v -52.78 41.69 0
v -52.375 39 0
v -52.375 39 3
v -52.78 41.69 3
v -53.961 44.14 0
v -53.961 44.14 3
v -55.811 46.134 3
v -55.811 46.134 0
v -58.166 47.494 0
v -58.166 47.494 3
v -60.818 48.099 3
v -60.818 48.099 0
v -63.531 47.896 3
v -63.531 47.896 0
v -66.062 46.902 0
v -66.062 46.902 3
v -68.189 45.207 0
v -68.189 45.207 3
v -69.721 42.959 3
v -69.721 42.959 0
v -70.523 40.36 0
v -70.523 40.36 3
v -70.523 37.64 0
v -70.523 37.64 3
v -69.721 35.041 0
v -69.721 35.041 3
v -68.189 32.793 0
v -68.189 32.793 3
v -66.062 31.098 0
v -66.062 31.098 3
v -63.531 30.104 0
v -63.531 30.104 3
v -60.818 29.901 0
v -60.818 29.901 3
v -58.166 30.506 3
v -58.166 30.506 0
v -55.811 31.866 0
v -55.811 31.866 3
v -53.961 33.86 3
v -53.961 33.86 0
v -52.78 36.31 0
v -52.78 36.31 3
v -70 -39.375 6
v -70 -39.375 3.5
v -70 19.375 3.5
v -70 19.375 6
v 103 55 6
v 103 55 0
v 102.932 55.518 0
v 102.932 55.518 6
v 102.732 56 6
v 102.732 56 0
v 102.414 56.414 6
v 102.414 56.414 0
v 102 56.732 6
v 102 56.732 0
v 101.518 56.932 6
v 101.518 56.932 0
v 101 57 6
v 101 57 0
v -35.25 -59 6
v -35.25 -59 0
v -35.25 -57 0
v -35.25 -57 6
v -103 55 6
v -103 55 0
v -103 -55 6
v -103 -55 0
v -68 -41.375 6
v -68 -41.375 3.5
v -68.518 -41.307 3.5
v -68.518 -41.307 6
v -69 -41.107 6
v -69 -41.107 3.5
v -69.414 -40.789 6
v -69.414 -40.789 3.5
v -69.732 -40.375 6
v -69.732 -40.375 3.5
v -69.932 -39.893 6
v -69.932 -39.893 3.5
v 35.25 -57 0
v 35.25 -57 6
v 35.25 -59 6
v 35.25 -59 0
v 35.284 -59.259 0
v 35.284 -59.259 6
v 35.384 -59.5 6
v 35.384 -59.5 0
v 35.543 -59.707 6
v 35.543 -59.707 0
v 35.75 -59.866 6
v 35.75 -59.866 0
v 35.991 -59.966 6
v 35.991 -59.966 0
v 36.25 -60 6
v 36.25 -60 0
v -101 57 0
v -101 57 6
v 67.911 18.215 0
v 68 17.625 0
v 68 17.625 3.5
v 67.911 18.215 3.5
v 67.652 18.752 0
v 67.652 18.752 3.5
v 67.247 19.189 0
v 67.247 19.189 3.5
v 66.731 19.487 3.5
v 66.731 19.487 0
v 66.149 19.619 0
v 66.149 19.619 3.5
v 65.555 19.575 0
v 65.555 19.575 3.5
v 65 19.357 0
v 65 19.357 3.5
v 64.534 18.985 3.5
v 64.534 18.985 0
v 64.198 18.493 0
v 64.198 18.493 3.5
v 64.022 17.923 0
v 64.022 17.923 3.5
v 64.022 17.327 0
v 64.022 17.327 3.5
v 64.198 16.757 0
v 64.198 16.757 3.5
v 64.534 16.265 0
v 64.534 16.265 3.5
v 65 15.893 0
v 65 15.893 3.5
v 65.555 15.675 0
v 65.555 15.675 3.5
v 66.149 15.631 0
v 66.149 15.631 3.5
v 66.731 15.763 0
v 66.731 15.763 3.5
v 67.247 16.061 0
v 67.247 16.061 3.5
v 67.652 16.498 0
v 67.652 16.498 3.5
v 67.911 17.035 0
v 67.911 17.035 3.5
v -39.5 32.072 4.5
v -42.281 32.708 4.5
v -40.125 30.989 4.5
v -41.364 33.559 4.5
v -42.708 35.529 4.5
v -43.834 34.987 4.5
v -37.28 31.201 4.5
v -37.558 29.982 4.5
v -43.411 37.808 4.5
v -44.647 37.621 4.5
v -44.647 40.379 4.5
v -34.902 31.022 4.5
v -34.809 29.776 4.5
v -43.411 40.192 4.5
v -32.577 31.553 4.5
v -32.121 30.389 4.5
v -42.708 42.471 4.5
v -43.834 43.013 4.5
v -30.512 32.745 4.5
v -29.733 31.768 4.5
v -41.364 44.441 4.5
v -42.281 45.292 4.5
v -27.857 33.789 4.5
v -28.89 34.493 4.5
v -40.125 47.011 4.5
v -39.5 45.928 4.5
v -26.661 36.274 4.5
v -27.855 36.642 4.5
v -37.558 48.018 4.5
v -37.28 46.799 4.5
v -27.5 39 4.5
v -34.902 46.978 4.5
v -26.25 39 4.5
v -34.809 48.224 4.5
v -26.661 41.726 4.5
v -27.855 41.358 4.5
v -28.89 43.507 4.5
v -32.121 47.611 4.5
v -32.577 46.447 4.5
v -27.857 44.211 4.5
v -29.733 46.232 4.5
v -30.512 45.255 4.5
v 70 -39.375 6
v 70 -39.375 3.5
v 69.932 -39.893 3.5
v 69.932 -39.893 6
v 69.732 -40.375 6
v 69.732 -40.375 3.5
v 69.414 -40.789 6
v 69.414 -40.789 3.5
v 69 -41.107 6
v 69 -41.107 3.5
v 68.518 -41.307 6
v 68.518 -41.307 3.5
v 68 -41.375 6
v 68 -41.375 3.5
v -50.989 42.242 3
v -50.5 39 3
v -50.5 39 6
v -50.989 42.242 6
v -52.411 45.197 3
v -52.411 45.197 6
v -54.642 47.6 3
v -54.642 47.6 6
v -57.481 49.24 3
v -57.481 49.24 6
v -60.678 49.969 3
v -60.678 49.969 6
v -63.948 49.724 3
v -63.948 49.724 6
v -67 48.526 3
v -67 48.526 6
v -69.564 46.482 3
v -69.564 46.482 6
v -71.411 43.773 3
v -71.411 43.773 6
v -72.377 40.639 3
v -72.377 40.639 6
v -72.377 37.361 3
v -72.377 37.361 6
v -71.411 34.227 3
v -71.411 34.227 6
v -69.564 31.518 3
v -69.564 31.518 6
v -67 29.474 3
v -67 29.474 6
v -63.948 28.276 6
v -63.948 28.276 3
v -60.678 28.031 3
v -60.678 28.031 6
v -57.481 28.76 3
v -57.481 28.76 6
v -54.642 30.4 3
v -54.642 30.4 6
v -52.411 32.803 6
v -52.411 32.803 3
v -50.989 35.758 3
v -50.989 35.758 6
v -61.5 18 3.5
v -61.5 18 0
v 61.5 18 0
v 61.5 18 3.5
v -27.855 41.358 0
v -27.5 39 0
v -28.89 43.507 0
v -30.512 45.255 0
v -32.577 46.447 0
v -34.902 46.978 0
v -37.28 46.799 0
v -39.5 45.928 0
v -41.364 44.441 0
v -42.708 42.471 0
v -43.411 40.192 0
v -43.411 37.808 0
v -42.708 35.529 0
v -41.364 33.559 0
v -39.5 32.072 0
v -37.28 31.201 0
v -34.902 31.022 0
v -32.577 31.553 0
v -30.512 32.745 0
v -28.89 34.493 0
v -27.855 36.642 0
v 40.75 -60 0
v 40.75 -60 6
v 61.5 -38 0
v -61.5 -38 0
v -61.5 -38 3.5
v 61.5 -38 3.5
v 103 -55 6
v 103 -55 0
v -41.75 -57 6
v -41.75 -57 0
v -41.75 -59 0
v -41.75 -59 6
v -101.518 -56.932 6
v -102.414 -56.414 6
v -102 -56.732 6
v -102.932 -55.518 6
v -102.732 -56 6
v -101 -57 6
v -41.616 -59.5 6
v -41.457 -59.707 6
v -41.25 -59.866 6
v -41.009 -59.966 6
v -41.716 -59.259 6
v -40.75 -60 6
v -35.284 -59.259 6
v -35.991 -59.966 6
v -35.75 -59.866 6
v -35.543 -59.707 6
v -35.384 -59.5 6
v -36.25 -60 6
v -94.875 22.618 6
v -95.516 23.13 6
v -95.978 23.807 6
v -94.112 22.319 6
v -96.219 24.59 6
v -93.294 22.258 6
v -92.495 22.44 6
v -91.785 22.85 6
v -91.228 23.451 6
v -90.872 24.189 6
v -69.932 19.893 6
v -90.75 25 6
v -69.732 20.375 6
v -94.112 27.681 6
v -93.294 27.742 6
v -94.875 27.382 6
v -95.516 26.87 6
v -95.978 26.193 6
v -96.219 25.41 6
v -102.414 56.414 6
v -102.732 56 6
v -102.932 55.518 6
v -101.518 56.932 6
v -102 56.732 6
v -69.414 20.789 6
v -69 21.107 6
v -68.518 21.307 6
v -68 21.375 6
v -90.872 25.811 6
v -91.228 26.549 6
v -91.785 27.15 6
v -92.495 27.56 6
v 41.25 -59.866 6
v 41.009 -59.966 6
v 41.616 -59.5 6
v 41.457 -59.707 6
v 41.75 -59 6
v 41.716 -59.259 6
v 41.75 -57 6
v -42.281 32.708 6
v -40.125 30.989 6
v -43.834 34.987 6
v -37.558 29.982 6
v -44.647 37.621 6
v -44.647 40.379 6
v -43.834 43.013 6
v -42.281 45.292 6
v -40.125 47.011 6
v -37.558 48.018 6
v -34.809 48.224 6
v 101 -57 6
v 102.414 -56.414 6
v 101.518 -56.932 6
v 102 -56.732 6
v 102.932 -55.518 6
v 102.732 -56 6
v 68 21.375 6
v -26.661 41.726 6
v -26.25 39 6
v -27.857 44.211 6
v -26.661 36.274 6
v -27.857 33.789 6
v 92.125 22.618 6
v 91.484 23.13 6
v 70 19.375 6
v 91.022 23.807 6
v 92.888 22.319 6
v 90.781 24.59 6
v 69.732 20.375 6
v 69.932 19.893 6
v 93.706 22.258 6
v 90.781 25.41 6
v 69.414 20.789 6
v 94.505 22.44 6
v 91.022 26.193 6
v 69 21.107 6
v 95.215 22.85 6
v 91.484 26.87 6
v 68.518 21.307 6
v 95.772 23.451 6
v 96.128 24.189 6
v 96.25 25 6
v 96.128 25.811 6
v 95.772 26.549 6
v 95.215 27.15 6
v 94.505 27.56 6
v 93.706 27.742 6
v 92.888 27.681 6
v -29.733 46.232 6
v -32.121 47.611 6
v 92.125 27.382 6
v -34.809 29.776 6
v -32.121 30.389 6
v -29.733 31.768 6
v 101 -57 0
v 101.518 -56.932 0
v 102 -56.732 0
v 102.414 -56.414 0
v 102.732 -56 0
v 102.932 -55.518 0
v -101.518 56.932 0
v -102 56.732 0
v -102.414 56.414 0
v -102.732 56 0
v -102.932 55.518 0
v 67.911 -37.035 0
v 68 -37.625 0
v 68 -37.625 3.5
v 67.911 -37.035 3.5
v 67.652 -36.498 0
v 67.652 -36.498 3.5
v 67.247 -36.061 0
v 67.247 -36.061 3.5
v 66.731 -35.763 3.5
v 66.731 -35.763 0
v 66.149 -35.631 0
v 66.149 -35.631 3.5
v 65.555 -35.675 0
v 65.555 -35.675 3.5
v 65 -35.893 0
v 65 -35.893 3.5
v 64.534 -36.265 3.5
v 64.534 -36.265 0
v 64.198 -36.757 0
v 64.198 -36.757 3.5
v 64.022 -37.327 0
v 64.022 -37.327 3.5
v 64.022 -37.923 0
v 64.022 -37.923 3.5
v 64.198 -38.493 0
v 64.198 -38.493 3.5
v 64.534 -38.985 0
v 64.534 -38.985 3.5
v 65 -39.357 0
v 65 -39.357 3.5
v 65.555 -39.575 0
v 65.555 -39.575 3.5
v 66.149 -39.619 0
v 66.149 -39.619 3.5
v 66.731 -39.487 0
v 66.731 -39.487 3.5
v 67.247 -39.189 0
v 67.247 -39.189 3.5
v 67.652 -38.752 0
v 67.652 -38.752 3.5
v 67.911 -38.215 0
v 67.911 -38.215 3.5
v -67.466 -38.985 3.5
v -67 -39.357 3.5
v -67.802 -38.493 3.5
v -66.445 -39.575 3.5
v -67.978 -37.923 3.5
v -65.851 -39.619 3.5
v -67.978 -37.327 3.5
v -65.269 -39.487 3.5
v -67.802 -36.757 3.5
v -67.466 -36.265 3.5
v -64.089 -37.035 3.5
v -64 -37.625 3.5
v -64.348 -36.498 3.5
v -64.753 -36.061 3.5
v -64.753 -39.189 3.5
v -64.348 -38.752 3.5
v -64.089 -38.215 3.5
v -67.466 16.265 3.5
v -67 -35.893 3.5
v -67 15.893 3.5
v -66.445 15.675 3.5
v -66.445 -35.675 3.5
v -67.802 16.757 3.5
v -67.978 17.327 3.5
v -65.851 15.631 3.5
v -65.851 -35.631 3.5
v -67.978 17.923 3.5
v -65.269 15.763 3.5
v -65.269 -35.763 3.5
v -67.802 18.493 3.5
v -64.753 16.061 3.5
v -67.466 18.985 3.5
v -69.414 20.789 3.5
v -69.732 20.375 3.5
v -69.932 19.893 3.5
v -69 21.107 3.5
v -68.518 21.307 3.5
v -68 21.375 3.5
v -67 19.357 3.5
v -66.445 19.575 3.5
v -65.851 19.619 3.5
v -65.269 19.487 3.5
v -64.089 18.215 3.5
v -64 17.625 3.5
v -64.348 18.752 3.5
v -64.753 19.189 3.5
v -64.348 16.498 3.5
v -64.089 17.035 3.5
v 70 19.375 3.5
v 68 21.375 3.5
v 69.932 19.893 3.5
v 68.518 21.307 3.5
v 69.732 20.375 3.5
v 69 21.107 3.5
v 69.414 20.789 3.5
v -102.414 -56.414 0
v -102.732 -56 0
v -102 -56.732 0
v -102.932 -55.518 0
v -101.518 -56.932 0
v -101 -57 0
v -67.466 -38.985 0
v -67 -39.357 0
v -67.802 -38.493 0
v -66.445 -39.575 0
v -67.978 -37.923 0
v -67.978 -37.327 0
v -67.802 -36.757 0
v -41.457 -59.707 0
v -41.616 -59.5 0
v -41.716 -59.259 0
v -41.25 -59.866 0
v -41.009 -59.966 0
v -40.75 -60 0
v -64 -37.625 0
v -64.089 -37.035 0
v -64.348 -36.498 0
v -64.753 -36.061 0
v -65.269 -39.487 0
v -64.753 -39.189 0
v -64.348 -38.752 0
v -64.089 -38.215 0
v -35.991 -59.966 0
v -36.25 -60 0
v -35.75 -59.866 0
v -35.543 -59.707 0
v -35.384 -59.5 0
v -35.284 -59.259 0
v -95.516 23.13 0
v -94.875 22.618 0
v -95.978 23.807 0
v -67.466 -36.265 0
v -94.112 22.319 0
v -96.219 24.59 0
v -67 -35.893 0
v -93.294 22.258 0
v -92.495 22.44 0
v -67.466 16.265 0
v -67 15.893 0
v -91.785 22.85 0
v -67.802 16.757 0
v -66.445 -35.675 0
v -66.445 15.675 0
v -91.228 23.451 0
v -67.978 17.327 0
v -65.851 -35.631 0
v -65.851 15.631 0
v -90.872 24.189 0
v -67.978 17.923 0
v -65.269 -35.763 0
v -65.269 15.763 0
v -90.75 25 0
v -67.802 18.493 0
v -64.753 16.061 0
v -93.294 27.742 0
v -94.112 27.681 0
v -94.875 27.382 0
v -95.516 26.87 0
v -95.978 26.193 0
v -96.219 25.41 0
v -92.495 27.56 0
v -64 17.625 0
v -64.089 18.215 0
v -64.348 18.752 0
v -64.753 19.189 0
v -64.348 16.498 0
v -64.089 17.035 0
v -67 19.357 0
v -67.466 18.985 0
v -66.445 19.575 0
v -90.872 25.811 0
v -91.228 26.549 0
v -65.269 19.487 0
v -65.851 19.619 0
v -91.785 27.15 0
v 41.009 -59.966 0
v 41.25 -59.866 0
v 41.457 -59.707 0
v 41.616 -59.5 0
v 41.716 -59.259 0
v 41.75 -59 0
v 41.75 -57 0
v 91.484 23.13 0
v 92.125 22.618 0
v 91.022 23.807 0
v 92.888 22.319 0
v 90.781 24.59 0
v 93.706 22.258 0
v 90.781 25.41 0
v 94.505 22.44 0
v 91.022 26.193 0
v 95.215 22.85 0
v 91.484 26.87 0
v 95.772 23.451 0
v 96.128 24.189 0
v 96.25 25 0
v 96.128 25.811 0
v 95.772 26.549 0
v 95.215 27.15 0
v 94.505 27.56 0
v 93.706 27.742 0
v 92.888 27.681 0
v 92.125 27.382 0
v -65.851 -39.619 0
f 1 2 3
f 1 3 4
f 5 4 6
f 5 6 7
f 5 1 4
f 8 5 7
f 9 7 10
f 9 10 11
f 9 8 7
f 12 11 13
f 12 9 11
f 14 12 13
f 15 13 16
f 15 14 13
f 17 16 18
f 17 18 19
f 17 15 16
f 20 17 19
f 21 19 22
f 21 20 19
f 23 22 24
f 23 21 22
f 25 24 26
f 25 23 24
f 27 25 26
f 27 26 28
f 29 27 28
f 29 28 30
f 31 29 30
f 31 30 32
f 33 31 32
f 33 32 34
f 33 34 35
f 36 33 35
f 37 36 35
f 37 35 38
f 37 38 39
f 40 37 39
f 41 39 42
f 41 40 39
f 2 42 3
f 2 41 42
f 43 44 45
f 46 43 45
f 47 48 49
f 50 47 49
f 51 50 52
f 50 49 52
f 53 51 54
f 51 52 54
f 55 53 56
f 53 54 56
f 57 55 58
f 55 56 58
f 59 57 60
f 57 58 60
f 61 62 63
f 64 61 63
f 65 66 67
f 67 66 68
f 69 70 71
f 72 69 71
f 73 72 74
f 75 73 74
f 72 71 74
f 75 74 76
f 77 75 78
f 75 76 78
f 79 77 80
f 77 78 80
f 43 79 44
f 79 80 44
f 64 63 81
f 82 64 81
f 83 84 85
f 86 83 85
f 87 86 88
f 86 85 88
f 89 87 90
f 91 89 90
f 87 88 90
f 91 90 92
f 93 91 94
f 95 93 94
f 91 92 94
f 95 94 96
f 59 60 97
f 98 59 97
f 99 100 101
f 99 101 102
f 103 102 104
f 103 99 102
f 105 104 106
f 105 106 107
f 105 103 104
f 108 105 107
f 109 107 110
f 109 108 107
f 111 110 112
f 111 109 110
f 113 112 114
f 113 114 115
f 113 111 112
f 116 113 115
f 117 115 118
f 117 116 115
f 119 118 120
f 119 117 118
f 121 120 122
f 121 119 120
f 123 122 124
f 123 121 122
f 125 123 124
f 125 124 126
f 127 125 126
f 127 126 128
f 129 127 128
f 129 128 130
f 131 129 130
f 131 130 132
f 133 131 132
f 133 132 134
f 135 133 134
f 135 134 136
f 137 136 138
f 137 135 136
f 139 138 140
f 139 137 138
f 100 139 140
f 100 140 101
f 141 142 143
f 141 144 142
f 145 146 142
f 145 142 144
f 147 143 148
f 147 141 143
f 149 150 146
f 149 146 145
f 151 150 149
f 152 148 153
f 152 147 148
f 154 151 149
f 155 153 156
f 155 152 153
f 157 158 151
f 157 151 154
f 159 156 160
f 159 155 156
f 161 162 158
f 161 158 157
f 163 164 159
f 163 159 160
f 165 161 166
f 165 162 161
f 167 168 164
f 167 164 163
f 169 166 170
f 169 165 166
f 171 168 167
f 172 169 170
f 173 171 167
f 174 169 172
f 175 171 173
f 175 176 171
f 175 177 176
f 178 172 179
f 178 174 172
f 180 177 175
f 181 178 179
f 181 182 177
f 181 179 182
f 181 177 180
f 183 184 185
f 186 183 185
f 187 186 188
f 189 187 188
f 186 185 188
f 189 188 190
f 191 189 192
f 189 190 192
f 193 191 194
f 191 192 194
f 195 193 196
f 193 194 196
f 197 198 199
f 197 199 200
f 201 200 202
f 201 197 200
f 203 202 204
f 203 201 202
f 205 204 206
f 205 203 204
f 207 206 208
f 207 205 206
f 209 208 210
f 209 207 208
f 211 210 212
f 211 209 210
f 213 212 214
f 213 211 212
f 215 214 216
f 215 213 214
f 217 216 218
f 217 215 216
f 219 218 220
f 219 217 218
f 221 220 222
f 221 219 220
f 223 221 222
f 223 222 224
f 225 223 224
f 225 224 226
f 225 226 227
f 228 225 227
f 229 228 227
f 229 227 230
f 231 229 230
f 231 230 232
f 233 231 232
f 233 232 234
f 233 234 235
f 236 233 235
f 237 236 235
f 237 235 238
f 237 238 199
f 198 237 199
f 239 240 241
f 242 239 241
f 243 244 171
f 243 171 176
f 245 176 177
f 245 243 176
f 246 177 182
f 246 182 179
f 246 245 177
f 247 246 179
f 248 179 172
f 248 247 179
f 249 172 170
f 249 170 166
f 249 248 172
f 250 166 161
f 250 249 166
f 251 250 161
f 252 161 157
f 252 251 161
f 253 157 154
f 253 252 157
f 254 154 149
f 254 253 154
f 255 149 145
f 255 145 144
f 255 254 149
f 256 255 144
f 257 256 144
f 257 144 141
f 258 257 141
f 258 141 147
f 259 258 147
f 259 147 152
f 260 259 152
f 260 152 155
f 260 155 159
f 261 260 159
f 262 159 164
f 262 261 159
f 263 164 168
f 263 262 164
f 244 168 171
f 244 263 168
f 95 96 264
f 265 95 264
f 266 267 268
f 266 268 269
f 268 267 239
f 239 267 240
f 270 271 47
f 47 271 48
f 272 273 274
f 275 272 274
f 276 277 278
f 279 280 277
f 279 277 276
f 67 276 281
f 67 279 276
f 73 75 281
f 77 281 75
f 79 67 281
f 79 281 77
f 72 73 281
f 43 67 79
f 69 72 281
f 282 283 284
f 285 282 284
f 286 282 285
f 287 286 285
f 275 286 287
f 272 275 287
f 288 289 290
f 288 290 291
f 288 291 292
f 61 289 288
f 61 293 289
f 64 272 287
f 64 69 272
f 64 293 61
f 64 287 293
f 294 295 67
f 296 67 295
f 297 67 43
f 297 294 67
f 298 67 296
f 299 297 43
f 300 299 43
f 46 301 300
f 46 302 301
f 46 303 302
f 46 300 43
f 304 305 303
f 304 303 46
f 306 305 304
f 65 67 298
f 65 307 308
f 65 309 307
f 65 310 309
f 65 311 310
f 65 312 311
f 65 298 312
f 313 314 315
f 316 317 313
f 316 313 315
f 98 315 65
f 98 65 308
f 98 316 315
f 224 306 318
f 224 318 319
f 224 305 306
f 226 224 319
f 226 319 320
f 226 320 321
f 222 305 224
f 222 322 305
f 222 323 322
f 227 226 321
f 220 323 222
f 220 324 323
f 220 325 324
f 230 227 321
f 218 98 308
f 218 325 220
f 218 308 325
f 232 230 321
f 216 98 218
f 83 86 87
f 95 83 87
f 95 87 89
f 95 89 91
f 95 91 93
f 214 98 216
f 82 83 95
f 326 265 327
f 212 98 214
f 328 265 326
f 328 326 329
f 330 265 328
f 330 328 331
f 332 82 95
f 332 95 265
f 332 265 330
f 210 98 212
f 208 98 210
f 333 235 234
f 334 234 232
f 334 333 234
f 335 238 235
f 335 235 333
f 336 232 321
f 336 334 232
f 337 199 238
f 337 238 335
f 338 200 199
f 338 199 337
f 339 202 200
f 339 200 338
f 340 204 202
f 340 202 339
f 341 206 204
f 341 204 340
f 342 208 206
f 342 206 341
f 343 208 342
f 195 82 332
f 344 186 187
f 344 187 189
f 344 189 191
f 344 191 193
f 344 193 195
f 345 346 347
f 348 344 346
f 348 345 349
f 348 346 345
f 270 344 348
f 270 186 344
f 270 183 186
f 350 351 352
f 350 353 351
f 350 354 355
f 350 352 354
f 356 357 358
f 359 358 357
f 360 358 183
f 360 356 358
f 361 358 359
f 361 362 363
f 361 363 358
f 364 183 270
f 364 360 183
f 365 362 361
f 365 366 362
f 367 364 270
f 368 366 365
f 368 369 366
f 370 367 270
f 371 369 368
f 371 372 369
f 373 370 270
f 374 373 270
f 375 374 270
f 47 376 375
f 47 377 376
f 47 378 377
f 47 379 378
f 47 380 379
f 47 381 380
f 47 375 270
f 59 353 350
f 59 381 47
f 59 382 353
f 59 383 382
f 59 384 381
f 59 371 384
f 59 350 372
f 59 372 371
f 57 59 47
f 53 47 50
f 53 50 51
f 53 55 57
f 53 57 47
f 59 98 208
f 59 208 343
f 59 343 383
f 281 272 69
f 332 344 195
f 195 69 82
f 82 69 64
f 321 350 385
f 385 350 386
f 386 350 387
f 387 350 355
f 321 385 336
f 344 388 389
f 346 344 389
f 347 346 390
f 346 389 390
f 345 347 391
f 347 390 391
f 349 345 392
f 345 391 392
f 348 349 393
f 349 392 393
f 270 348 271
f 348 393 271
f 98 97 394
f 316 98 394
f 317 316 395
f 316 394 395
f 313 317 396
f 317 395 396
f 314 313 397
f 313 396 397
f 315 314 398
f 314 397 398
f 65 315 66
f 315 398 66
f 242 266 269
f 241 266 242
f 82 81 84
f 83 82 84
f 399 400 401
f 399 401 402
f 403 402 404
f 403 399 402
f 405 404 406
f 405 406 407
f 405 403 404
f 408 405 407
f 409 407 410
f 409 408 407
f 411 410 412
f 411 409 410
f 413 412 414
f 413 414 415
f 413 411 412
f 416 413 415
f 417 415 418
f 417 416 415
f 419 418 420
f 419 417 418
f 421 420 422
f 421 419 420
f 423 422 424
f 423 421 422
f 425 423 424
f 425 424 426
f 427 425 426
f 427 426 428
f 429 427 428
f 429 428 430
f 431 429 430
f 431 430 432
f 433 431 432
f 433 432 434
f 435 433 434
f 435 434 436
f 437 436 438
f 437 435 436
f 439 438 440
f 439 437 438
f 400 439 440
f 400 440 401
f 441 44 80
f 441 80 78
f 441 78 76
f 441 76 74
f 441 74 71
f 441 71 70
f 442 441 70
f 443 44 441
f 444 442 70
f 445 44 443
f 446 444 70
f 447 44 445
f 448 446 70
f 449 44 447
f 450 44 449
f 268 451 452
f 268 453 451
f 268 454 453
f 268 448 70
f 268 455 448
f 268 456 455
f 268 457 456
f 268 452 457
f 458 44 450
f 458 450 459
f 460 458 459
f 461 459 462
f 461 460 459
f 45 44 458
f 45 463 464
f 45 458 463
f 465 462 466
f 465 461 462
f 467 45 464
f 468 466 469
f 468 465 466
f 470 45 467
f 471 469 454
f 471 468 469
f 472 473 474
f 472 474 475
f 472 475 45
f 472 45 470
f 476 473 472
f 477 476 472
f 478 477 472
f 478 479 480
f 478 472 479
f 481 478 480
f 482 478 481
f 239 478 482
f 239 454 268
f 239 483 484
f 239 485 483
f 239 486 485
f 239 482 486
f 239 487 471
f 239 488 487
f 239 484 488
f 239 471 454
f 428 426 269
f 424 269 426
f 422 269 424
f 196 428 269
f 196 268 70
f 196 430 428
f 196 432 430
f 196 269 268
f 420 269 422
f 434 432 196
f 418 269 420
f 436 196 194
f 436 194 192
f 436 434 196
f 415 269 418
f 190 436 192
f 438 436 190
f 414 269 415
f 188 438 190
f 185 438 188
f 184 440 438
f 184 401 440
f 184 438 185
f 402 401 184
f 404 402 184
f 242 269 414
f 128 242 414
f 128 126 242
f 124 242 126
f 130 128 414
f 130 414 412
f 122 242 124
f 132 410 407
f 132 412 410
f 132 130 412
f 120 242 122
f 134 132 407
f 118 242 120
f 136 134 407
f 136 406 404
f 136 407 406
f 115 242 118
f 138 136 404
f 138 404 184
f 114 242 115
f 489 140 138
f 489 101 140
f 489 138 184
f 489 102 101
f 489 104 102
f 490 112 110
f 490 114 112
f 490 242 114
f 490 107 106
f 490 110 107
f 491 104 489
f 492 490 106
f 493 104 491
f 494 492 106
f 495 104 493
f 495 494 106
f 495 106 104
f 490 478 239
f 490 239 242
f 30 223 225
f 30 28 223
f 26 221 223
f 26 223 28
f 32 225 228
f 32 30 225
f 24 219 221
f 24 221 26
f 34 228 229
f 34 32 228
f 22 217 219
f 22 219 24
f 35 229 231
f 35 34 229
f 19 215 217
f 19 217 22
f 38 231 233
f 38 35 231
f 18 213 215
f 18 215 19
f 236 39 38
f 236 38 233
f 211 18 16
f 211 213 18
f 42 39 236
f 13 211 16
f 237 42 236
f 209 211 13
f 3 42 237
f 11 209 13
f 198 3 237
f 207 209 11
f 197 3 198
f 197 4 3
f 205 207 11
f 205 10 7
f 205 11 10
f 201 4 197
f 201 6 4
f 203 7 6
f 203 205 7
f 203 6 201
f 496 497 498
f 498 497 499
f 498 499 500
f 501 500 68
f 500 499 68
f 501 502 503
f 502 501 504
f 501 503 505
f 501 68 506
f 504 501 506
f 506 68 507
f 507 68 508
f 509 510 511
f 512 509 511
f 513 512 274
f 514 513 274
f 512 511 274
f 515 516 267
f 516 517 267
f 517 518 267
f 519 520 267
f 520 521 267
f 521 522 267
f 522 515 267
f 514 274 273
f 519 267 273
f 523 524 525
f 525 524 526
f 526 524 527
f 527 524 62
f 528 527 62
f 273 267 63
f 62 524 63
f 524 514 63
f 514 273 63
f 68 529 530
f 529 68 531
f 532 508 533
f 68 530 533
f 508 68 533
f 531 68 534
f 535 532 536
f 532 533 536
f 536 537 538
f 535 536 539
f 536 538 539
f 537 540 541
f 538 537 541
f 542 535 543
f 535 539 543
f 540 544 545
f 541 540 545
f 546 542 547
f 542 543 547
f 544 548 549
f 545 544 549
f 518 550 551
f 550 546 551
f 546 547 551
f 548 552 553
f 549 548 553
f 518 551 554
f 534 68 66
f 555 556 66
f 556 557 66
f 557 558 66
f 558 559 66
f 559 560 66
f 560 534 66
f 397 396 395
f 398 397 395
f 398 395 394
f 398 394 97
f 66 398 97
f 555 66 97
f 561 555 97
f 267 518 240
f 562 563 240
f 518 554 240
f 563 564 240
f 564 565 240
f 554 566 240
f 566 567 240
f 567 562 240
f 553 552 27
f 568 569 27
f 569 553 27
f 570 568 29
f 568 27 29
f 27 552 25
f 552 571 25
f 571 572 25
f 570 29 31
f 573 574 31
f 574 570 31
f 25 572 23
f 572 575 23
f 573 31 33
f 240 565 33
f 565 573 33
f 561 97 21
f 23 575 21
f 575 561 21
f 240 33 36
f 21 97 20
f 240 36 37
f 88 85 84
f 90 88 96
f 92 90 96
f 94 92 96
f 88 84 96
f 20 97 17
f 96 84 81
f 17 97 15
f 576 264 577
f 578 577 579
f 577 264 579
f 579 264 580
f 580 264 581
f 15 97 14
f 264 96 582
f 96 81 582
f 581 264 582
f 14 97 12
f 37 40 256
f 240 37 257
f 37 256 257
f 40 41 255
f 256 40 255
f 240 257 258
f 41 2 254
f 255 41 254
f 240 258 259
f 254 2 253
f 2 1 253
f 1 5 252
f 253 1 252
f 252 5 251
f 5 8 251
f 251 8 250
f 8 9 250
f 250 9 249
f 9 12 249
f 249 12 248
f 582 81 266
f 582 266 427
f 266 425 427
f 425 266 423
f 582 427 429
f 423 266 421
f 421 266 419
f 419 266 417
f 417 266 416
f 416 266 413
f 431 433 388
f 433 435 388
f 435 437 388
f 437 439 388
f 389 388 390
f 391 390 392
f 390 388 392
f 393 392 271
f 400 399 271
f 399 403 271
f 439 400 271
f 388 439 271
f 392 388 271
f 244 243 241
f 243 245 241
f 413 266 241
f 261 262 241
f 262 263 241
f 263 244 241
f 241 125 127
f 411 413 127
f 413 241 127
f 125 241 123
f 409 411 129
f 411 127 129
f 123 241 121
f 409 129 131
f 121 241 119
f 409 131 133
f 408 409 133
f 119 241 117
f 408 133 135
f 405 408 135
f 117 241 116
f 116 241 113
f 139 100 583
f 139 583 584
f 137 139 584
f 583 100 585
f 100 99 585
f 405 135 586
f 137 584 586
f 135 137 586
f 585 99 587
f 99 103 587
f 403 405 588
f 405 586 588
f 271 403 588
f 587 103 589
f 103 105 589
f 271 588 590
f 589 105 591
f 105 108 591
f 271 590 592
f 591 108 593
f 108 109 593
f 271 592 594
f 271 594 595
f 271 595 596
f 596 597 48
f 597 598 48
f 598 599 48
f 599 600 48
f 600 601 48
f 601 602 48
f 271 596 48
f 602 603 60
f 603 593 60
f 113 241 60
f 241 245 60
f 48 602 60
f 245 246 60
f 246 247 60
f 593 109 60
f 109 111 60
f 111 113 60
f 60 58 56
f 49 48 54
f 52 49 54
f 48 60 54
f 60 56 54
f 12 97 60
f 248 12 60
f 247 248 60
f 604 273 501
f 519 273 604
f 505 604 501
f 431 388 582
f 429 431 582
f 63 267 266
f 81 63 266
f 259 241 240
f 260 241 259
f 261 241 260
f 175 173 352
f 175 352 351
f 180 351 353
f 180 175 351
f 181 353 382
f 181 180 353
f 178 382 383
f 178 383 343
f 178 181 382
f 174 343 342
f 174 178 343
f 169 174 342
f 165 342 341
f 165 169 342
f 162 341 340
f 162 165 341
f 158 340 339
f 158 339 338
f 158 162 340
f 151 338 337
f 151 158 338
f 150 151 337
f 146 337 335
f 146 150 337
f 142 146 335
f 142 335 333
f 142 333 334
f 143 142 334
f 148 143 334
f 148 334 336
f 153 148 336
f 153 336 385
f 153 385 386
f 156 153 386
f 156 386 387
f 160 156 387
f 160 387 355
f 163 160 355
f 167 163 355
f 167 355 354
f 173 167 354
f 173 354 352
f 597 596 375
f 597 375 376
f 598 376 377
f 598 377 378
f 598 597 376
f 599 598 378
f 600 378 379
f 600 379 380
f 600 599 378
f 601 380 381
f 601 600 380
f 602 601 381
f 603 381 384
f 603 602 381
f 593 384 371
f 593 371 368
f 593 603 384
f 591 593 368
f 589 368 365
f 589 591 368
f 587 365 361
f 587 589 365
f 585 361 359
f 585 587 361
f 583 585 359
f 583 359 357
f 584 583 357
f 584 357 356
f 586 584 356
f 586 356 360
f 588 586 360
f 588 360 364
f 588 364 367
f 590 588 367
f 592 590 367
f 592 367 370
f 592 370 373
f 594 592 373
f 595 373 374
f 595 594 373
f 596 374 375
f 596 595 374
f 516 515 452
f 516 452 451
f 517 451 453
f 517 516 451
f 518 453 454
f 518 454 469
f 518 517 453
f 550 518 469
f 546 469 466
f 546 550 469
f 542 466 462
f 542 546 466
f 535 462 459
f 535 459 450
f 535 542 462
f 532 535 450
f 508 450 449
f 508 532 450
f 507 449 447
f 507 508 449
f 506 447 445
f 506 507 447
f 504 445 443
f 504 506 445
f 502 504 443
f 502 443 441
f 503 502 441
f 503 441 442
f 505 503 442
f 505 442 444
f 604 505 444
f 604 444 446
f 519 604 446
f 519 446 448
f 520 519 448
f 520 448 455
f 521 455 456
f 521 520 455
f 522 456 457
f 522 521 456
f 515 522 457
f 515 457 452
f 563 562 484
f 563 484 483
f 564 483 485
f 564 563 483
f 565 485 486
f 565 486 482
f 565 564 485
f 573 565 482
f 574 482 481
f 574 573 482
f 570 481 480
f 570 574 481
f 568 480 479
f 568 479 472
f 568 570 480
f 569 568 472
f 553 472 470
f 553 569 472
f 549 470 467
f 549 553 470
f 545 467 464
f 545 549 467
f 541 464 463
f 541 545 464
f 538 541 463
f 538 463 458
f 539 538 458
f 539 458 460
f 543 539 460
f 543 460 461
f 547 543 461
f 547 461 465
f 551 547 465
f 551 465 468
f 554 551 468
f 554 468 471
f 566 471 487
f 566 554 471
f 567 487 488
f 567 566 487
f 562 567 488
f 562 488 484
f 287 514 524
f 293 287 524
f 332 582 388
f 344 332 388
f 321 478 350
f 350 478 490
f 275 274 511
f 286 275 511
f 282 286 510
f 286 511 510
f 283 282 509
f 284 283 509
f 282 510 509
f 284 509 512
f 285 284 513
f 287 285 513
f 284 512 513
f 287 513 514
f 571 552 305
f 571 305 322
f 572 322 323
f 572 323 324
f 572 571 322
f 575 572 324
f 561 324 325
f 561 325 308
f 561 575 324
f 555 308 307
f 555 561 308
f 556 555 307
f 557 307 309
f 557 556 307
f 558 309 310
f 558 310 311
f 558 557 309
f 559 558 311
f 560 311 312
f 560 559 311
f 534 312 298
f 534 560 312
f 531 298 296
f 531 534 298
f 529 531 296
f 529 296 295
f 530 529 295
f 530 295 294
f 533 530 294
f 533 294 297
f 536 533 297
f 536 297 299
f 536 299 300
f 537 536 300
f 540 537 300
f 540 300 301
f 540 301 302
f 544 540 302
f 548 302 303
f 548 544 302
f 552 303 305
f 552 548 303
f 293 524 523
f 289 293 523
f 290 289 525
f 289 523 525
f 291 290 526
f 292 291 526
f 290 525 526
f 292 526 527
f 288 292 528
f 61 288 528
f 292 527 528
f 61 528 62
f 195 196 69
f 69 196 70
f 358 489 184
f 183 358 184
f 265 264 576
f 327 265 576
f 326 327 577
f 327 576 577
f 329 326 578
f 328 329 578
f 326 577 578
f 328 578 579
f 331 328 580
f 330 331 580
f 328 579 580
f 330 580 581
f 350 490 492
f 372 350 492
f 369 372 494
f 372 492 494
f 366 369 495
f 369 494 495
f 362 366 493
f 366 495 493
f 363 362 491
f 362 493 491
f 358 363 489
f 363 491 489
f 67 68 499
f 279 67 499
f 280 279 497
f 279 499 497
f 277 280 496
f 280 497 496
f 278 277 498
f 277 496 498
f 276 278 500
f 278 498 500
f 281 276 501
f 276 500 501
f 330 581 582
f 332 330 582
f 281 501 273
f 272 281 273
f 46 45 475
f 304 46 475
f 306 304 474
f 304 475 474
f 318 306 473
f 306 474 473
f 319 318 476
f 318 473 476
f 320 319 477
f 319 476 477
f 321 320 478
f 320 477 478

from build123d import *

# Parameters (mm, degrees)
F0_R     = 2.75
F0_R_2   = 11
F0_R_3   = 9.25
F1_DEPTH = 6
F0_R_4   = 2
F0_W     = 123
F0_H     = 56
F2_DEPTH = 3.5
F0_R_5   = 9.125
F3_DEPTH = 3
F0_R_6   = 8
F4_DEPTH = 4.5


with BuildPart() as f1:
    # F0 (on Top) → F1 (new body)
    with BuildSketch(Plane.XY):
        with BuildLine():
            Line((41.75, -57), (101, -57))
            ThreePointArc((101, -57), (102.414214, -56.414214), (103, -55))
            Line((103, -55), (103, 55))
            ThreePointArc((103, 55), (102.414214, 56.414214), (101, 57))
            Line((101, 57), (-101, 57))
            ThreePointArc((-101, 57), (-102.414214, 56.414214), (-103, 55))
            Line((-103, 55), (-103, -55))
            ThreePointArc((-103, -55), (-102.414214, -56.414214), (-101, -57))
            Line((-101, -57), (-41.75, -57))
            Line((-41.75, -57), (-35.25, -57))
            Line((-35.25, -57), (0, -57))
            Line((0, -57), (35.25, -57))
            Line((35.25, -57), (41.75, -57))
        make_face()
        with BuildLine():
            ThreePointArc((70, -39.375), (69.414214, -40.789214), (68, -41.375))
            Line((68, -41.375), (-68, -41.375))
            ThreePointArc((-68, -41.375), (-69.414214, -40.789214), (-70, -39.375))
            Line((-70, -39.375), (-70, 19.375))
            ThreePointArc((-70, 19.375), (-69.414214, 20.789214), (-68, 21.375))
            Line((-68, 21.375), (68, 21.375))
            ThreePointArc((68, 21.375), (69.414214, 20.789214), (70, 19.375))
            Line((70, 19.375), (70, -39.375))
        make_face(mode=Mode.SUBTRACT)
        with Locations((-93.5, 25)):
            Circle(F0_R, mode=Mode.SUBTRACT)
        with Locations((-61.5, 39)):
            Circle(F0_R_2, mode=Mode.SUBTRACT)
        with Locations((-35.5, 39)):
            Circle(F0_R_3, mode=Mode.SUBTRACT)
        with Locations((93.5, 25)):
            Circle(F0_R, mode=Mode.SUBTRACT)
        with BuildLine():
            Line((-35.25, -59), (-35.25, -57))
            Line((-35.25, -57), (-41.75, -57))
            Line((-41.75, -57), (-41.75, -59))
            ThreePointArc((-41.75, -59), (-41.457107, -59.707107), (-40.75, -60))
            Line((-40.75, -60), (-36.25, -60))
            ThreePointArc((-36.25, -60), (-35.542893, -59.707107), (-35.25, -59))
        make_face()
        with BuildLine():
            Line((41.75, -59), (41.75, -57))
            Line((41.75, -57), (35.25, -57))
            Line((35.25, -57), (35.25, -59))
            ThreePointArc((35.25, -59), (35.542893, -59.707107), (36.25, -60))
            Line((36.25, -60), (40.75, -60))
            ThreePointArc((40.75, -60), (41.457107, -59.707107), (41.75, -59))
        make_face()
    extrude(amount=F1_DEPTH)

    # F0 (on Top) → F2 (join)
    with BuildSketch(Plane.XY):
        with BuildLine():
            Line((-68, -41.375), (68, -41.375))
            ThreePointArc((68, -41.375), (69.414214, -40.789214), (70, -39.375))
            Line((70, -39.375), (70, 19.375))
            ThreePointArc((70, 19.375), (69.414214, 20.789214), (68, 21.375))
            Line((68, 21.375), (-68, 21.375))
            ThreePointArc((-68, 21.375), (-69.414214, 20.789214), (-70, 19.375))
            Line((-70, 19.375), (-70, -39.375))
            ThreePointArc((-70, -39.375), (-69.414214, -40.789214), (-68, -41.375))
        make_face()
        with Locations((-66, -37.625)):
            Circle(F0_R_4, mode=Mode.SUBTRACT)
        with Locations((0, -10)):
            Rectangle(F0_W, F0_H, mode=Mode.SUBTRACT)
        with Locations((66, -37.625)):
            Circle(F0_R_4, mode=Mode.SUBTRACT)
        with Locations((-66, 17.625)):
            Circle(F0_R_4, mode=Mode.SUBTRACT)
        with Locations((66, 17.625)):
            Circle(F0_R_4, mode=Mode.SUBTRACT)
    extrude(amount=F2_DEPTH)

    # F0 (on Top) → F3 (join)
    with BuildSketch(Plane.XY):
        with Locations((-61.5, 39)):
            Circle(F0_R_2)
        with Locations((-61.5, 39)):
            Circle(F0_R_5, mode=Mode.SUBTRACT)
    extrude(amount=F3_DEPTH)

    # F0 (on Top) → F4 (join)
    with BuildSketch(Plane.XY):
        with Locations((-35.5, 39)):
            Circle(F0_R_3)
        with Locations((-35.5, 39)):
            Circle(F0_R_6, mode=Mode.SUBTRACT)
    extrude(amount=F4_DEPTH)


solid = f1.part
